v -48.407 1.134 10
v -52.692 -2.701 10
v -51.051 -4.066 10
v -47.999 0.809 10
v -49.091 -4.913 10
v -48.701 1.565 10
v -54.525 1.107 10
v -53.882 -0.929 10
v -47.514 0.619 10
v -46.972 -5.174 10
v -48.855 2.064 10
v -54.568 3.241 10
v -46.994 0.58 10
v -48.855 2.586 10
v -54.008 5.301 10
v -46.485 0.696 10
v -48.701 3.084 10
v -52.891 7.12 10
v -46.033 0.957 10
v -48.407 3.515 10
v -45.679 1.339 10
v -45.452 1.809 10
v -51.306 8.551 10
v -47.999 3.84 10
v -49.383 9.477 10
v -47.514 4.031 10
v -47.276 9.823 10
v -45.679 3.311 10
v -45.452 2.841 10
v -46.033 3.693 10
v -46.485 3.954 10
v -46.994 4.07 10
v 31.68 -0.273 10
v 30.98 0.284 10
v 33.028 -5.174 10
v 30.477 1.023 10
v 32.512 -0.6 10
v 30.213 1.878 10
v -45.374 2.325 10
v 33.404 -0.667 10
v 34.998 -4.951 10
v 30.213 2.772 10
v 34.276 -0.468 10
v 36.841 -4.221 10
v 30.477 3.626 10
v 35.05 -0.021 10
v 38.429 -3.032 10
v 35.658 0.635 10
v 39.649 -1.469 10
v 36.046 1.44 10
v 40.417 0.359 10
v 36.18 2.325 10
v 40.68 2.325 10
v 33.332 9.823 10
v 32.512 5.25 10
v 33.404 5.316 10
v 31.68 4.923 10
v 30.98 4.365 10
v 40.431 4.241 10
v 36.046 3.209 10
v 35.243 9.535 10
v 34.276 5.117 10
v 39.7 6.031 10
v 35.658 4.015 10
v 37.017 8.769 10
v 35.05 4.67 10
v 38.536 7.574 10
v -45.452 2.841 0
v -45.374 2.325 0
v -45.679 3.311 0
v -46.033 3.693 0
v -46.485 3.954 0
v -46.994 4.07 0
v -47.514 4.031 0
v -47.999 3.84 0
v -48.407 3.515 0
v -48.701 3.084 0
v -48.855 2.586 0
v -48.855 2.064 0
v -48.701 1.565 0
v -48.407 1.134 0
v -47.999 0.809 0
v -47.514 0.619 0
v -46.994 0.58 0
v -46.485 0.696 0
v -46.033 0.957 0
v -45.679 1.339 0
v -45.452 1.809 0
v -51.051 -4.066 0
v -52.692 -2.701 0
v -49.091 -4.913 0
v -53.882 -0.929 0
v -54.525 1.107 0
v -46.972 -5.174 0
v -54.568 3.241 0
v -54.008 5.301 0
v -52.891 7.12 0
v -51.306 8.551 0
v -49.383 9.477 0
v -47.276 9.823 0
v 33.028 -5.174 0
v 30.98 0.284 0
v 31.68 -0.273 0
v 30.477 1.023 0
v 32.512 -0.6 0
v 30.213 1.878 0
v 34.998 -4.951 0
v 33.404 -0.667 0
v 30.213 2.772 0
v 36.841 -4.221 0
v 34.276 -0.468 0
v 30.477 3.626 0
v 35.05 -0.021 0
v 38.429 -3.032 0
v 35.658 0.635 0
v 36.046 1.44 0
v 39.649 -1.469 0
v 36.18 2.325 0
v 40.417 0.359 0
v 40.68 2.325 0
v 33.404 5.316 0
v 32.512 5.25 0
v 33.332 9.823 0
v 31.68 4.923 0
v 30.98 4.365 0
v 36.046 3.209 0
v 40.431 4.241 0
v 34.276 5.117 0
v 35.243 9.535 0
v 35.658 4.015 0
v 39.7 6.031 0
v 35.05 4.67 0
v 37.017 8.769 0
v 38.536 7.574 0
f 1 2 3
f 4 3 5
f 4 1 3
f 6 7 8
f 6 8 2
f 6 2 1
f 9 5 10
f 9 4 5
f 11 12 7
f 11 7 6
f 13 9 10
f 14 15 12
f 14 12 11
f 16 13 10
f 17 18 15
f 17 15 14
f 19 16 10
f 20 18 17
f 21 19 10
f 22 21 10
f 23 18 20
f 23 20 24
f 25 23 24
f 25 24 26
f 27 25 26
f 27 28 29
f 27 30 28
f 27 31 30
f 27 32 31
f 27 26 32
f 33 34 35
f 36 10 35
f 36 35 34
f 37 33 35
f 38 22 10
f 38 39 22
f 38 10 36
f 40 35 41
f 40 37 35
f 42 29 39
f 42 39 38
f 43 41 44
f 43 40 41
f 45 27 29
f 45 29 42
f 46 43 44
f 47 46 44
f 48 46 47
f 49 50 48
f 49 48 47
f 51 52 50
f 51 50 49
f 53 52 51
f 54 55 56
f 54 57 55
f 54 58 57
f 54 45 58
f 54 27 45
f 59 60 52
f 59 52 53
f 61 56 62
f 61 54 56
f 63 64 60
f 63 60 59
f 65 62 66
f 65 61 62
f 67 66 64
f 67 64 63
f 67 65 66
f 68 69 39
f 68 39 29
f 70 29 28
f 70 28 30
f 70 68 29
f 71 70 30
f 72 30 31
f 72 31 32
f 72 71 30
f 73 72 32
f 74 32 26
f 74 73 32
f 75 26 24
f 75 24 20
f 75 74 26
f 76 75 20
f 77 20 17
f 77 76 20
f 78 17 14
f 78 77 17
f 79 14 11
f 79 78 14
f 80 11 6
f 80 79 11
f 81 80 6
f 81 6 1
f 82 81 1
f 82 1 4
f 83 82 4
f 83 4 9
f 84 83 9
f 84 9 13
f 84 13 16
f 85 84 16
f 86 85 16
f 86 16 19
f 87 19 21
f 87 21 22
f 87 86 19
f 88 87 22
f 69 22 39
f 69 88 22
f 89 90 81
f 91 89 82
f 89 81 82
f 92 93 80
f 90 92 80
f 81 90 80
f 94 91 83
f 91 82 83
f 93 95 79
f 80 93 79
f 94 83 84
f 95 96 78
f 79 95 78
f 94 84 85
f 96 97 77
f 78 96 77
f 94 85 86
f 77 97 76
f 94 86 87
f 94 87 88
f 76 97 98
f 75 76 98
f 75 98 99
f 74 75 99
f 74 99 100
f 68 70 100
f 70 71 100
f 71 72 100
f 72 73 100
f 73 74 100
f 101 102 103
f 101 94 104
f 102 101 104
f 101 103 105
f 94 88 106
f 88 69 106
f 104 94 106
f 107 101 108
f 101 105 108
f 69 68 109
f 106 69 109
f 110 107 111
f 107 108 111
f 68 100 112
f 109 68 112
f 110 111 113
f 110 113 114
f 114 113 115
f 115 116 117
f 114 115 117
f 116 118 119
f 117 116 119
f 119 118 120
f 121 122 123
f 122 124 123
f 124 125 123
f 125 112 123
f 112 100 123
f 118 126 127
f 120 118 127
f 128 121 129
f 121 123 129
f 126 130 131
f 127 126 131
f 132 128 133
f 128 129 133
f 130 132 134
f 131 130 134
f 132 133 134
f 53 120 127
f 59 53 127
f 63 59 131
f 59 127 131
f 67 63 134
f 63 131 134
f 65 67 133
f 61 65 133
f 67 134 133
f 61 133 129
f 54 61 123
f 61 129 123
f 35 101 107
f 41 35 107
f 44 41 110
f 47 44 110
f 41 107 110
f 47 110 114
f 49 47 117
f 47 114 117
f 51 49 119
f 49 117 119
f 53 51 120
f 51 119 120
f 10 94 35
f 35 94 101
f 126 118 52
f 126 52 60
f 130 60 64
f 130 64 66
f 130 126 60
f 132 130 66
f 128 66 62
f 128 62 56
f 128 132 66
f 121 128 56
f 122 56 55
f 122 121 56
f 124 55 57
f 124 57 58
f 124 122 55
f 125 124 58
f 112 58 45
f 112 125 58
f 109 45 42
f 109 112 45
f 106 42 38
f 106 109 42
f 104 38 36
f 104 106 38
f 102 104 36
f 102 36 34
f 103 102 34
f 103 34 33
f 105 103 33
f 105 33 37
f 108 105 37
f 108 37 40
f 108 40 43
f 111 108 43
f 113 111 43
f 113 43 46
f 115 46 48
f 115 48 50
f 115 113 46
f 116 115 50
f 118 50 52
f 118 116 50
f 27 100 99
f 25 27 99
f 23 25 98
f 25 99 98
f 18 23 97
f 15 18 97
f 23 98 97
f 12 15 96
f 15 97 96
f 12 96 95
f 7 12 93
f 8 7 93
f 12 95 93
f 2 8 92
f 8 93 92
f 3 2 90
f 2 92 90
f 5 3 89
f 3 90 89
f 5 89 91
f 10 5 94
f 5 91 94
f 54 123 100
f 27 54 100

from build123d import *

# Parameters (mm, degrees)
SKETCH_1_R      = 1.75
SKETCH_1_R_2    = 3
EXTRUDE_2_DEPTH = 10


with BuildPart() as part:
    # 草图1 → 凸台-拉伸2 (new body)
    # profile 1 of 3: a face of its own
    with BuildSketch(Plane.XY):
        with BuildLine():
            Line((-46.972427161, 9.823182252), (-47.276428481, 9.823182252))
            ThreePointArc((-47.276428481, 9.823182252), (-54.622887383, 2.17272203), (-46.972427161, -5.173736872))
            ThreePointArc((-46.972427161, -5.173736872), (-41.767656174, -2.92456274), (-39.624427821, 2.32472269))
            ThreePointArc((-39.624427821, 2.32472269), (-41.767656174, 7.57400812), (-46.972427161, 9.823182252))
        make_face()
        with Locations((-47.124427821, 2.32472269)):
            Circle(SKETCH_1_R, mode=Mode.SUBTRACT)
    # profile 2 of 3: a face of its own
    with BuildSketch(Plane.XY):
        with BuildLine():
            Line((33.027572839, 9.823182252), (-46.972427161, 9.823182252))
            ThreePointArc((-46.972427161, 9.823182252), (-41.767656174, 7.57400812), (-39.624427821, 2.32472269))
            ThreePointArc((-39.624427821, 2.32472269), (-41.767656174, -2.92456274), (-46.972427161, -5.173736872))
            Line((-46.972427161, -5.173736872), (33.027572839, -5.173736872))
            ThreePointArc((33.027572839, -5.173736872), (25.679573499, 2.32472269), (33.027572839, 9.823182252))
        make_face()
    # profile 3 of 3: a face of its own
    with BuildSketch(Plane.XY):
        with BuildLine():
            Line((33.331574159, 9.823182252), (33.027572839, 9.823182252))
            ThreePointArc((33.027572839, 9.823182252), (25.679573499, 2.32472269), (33.027572839, -5.173736872))
            ThreePointArc((33.027572839, -5.173736872), (38.428858929, -3.032048957), (40.679573499, 2.32472269))
            ThreePointArc((40.679573499, 2.32472269), (38.536345146, 7.57400812), (33.331574159, 9.823182252))
        make_face()
        with Locations((33.179573499, 2.32472269)):
            Circle(SKETCH_1_R_2, mode=Mode.SUBTRACT)
    extrude(amount=EXTRUDE_2_DEPTH)


solid = part.part
